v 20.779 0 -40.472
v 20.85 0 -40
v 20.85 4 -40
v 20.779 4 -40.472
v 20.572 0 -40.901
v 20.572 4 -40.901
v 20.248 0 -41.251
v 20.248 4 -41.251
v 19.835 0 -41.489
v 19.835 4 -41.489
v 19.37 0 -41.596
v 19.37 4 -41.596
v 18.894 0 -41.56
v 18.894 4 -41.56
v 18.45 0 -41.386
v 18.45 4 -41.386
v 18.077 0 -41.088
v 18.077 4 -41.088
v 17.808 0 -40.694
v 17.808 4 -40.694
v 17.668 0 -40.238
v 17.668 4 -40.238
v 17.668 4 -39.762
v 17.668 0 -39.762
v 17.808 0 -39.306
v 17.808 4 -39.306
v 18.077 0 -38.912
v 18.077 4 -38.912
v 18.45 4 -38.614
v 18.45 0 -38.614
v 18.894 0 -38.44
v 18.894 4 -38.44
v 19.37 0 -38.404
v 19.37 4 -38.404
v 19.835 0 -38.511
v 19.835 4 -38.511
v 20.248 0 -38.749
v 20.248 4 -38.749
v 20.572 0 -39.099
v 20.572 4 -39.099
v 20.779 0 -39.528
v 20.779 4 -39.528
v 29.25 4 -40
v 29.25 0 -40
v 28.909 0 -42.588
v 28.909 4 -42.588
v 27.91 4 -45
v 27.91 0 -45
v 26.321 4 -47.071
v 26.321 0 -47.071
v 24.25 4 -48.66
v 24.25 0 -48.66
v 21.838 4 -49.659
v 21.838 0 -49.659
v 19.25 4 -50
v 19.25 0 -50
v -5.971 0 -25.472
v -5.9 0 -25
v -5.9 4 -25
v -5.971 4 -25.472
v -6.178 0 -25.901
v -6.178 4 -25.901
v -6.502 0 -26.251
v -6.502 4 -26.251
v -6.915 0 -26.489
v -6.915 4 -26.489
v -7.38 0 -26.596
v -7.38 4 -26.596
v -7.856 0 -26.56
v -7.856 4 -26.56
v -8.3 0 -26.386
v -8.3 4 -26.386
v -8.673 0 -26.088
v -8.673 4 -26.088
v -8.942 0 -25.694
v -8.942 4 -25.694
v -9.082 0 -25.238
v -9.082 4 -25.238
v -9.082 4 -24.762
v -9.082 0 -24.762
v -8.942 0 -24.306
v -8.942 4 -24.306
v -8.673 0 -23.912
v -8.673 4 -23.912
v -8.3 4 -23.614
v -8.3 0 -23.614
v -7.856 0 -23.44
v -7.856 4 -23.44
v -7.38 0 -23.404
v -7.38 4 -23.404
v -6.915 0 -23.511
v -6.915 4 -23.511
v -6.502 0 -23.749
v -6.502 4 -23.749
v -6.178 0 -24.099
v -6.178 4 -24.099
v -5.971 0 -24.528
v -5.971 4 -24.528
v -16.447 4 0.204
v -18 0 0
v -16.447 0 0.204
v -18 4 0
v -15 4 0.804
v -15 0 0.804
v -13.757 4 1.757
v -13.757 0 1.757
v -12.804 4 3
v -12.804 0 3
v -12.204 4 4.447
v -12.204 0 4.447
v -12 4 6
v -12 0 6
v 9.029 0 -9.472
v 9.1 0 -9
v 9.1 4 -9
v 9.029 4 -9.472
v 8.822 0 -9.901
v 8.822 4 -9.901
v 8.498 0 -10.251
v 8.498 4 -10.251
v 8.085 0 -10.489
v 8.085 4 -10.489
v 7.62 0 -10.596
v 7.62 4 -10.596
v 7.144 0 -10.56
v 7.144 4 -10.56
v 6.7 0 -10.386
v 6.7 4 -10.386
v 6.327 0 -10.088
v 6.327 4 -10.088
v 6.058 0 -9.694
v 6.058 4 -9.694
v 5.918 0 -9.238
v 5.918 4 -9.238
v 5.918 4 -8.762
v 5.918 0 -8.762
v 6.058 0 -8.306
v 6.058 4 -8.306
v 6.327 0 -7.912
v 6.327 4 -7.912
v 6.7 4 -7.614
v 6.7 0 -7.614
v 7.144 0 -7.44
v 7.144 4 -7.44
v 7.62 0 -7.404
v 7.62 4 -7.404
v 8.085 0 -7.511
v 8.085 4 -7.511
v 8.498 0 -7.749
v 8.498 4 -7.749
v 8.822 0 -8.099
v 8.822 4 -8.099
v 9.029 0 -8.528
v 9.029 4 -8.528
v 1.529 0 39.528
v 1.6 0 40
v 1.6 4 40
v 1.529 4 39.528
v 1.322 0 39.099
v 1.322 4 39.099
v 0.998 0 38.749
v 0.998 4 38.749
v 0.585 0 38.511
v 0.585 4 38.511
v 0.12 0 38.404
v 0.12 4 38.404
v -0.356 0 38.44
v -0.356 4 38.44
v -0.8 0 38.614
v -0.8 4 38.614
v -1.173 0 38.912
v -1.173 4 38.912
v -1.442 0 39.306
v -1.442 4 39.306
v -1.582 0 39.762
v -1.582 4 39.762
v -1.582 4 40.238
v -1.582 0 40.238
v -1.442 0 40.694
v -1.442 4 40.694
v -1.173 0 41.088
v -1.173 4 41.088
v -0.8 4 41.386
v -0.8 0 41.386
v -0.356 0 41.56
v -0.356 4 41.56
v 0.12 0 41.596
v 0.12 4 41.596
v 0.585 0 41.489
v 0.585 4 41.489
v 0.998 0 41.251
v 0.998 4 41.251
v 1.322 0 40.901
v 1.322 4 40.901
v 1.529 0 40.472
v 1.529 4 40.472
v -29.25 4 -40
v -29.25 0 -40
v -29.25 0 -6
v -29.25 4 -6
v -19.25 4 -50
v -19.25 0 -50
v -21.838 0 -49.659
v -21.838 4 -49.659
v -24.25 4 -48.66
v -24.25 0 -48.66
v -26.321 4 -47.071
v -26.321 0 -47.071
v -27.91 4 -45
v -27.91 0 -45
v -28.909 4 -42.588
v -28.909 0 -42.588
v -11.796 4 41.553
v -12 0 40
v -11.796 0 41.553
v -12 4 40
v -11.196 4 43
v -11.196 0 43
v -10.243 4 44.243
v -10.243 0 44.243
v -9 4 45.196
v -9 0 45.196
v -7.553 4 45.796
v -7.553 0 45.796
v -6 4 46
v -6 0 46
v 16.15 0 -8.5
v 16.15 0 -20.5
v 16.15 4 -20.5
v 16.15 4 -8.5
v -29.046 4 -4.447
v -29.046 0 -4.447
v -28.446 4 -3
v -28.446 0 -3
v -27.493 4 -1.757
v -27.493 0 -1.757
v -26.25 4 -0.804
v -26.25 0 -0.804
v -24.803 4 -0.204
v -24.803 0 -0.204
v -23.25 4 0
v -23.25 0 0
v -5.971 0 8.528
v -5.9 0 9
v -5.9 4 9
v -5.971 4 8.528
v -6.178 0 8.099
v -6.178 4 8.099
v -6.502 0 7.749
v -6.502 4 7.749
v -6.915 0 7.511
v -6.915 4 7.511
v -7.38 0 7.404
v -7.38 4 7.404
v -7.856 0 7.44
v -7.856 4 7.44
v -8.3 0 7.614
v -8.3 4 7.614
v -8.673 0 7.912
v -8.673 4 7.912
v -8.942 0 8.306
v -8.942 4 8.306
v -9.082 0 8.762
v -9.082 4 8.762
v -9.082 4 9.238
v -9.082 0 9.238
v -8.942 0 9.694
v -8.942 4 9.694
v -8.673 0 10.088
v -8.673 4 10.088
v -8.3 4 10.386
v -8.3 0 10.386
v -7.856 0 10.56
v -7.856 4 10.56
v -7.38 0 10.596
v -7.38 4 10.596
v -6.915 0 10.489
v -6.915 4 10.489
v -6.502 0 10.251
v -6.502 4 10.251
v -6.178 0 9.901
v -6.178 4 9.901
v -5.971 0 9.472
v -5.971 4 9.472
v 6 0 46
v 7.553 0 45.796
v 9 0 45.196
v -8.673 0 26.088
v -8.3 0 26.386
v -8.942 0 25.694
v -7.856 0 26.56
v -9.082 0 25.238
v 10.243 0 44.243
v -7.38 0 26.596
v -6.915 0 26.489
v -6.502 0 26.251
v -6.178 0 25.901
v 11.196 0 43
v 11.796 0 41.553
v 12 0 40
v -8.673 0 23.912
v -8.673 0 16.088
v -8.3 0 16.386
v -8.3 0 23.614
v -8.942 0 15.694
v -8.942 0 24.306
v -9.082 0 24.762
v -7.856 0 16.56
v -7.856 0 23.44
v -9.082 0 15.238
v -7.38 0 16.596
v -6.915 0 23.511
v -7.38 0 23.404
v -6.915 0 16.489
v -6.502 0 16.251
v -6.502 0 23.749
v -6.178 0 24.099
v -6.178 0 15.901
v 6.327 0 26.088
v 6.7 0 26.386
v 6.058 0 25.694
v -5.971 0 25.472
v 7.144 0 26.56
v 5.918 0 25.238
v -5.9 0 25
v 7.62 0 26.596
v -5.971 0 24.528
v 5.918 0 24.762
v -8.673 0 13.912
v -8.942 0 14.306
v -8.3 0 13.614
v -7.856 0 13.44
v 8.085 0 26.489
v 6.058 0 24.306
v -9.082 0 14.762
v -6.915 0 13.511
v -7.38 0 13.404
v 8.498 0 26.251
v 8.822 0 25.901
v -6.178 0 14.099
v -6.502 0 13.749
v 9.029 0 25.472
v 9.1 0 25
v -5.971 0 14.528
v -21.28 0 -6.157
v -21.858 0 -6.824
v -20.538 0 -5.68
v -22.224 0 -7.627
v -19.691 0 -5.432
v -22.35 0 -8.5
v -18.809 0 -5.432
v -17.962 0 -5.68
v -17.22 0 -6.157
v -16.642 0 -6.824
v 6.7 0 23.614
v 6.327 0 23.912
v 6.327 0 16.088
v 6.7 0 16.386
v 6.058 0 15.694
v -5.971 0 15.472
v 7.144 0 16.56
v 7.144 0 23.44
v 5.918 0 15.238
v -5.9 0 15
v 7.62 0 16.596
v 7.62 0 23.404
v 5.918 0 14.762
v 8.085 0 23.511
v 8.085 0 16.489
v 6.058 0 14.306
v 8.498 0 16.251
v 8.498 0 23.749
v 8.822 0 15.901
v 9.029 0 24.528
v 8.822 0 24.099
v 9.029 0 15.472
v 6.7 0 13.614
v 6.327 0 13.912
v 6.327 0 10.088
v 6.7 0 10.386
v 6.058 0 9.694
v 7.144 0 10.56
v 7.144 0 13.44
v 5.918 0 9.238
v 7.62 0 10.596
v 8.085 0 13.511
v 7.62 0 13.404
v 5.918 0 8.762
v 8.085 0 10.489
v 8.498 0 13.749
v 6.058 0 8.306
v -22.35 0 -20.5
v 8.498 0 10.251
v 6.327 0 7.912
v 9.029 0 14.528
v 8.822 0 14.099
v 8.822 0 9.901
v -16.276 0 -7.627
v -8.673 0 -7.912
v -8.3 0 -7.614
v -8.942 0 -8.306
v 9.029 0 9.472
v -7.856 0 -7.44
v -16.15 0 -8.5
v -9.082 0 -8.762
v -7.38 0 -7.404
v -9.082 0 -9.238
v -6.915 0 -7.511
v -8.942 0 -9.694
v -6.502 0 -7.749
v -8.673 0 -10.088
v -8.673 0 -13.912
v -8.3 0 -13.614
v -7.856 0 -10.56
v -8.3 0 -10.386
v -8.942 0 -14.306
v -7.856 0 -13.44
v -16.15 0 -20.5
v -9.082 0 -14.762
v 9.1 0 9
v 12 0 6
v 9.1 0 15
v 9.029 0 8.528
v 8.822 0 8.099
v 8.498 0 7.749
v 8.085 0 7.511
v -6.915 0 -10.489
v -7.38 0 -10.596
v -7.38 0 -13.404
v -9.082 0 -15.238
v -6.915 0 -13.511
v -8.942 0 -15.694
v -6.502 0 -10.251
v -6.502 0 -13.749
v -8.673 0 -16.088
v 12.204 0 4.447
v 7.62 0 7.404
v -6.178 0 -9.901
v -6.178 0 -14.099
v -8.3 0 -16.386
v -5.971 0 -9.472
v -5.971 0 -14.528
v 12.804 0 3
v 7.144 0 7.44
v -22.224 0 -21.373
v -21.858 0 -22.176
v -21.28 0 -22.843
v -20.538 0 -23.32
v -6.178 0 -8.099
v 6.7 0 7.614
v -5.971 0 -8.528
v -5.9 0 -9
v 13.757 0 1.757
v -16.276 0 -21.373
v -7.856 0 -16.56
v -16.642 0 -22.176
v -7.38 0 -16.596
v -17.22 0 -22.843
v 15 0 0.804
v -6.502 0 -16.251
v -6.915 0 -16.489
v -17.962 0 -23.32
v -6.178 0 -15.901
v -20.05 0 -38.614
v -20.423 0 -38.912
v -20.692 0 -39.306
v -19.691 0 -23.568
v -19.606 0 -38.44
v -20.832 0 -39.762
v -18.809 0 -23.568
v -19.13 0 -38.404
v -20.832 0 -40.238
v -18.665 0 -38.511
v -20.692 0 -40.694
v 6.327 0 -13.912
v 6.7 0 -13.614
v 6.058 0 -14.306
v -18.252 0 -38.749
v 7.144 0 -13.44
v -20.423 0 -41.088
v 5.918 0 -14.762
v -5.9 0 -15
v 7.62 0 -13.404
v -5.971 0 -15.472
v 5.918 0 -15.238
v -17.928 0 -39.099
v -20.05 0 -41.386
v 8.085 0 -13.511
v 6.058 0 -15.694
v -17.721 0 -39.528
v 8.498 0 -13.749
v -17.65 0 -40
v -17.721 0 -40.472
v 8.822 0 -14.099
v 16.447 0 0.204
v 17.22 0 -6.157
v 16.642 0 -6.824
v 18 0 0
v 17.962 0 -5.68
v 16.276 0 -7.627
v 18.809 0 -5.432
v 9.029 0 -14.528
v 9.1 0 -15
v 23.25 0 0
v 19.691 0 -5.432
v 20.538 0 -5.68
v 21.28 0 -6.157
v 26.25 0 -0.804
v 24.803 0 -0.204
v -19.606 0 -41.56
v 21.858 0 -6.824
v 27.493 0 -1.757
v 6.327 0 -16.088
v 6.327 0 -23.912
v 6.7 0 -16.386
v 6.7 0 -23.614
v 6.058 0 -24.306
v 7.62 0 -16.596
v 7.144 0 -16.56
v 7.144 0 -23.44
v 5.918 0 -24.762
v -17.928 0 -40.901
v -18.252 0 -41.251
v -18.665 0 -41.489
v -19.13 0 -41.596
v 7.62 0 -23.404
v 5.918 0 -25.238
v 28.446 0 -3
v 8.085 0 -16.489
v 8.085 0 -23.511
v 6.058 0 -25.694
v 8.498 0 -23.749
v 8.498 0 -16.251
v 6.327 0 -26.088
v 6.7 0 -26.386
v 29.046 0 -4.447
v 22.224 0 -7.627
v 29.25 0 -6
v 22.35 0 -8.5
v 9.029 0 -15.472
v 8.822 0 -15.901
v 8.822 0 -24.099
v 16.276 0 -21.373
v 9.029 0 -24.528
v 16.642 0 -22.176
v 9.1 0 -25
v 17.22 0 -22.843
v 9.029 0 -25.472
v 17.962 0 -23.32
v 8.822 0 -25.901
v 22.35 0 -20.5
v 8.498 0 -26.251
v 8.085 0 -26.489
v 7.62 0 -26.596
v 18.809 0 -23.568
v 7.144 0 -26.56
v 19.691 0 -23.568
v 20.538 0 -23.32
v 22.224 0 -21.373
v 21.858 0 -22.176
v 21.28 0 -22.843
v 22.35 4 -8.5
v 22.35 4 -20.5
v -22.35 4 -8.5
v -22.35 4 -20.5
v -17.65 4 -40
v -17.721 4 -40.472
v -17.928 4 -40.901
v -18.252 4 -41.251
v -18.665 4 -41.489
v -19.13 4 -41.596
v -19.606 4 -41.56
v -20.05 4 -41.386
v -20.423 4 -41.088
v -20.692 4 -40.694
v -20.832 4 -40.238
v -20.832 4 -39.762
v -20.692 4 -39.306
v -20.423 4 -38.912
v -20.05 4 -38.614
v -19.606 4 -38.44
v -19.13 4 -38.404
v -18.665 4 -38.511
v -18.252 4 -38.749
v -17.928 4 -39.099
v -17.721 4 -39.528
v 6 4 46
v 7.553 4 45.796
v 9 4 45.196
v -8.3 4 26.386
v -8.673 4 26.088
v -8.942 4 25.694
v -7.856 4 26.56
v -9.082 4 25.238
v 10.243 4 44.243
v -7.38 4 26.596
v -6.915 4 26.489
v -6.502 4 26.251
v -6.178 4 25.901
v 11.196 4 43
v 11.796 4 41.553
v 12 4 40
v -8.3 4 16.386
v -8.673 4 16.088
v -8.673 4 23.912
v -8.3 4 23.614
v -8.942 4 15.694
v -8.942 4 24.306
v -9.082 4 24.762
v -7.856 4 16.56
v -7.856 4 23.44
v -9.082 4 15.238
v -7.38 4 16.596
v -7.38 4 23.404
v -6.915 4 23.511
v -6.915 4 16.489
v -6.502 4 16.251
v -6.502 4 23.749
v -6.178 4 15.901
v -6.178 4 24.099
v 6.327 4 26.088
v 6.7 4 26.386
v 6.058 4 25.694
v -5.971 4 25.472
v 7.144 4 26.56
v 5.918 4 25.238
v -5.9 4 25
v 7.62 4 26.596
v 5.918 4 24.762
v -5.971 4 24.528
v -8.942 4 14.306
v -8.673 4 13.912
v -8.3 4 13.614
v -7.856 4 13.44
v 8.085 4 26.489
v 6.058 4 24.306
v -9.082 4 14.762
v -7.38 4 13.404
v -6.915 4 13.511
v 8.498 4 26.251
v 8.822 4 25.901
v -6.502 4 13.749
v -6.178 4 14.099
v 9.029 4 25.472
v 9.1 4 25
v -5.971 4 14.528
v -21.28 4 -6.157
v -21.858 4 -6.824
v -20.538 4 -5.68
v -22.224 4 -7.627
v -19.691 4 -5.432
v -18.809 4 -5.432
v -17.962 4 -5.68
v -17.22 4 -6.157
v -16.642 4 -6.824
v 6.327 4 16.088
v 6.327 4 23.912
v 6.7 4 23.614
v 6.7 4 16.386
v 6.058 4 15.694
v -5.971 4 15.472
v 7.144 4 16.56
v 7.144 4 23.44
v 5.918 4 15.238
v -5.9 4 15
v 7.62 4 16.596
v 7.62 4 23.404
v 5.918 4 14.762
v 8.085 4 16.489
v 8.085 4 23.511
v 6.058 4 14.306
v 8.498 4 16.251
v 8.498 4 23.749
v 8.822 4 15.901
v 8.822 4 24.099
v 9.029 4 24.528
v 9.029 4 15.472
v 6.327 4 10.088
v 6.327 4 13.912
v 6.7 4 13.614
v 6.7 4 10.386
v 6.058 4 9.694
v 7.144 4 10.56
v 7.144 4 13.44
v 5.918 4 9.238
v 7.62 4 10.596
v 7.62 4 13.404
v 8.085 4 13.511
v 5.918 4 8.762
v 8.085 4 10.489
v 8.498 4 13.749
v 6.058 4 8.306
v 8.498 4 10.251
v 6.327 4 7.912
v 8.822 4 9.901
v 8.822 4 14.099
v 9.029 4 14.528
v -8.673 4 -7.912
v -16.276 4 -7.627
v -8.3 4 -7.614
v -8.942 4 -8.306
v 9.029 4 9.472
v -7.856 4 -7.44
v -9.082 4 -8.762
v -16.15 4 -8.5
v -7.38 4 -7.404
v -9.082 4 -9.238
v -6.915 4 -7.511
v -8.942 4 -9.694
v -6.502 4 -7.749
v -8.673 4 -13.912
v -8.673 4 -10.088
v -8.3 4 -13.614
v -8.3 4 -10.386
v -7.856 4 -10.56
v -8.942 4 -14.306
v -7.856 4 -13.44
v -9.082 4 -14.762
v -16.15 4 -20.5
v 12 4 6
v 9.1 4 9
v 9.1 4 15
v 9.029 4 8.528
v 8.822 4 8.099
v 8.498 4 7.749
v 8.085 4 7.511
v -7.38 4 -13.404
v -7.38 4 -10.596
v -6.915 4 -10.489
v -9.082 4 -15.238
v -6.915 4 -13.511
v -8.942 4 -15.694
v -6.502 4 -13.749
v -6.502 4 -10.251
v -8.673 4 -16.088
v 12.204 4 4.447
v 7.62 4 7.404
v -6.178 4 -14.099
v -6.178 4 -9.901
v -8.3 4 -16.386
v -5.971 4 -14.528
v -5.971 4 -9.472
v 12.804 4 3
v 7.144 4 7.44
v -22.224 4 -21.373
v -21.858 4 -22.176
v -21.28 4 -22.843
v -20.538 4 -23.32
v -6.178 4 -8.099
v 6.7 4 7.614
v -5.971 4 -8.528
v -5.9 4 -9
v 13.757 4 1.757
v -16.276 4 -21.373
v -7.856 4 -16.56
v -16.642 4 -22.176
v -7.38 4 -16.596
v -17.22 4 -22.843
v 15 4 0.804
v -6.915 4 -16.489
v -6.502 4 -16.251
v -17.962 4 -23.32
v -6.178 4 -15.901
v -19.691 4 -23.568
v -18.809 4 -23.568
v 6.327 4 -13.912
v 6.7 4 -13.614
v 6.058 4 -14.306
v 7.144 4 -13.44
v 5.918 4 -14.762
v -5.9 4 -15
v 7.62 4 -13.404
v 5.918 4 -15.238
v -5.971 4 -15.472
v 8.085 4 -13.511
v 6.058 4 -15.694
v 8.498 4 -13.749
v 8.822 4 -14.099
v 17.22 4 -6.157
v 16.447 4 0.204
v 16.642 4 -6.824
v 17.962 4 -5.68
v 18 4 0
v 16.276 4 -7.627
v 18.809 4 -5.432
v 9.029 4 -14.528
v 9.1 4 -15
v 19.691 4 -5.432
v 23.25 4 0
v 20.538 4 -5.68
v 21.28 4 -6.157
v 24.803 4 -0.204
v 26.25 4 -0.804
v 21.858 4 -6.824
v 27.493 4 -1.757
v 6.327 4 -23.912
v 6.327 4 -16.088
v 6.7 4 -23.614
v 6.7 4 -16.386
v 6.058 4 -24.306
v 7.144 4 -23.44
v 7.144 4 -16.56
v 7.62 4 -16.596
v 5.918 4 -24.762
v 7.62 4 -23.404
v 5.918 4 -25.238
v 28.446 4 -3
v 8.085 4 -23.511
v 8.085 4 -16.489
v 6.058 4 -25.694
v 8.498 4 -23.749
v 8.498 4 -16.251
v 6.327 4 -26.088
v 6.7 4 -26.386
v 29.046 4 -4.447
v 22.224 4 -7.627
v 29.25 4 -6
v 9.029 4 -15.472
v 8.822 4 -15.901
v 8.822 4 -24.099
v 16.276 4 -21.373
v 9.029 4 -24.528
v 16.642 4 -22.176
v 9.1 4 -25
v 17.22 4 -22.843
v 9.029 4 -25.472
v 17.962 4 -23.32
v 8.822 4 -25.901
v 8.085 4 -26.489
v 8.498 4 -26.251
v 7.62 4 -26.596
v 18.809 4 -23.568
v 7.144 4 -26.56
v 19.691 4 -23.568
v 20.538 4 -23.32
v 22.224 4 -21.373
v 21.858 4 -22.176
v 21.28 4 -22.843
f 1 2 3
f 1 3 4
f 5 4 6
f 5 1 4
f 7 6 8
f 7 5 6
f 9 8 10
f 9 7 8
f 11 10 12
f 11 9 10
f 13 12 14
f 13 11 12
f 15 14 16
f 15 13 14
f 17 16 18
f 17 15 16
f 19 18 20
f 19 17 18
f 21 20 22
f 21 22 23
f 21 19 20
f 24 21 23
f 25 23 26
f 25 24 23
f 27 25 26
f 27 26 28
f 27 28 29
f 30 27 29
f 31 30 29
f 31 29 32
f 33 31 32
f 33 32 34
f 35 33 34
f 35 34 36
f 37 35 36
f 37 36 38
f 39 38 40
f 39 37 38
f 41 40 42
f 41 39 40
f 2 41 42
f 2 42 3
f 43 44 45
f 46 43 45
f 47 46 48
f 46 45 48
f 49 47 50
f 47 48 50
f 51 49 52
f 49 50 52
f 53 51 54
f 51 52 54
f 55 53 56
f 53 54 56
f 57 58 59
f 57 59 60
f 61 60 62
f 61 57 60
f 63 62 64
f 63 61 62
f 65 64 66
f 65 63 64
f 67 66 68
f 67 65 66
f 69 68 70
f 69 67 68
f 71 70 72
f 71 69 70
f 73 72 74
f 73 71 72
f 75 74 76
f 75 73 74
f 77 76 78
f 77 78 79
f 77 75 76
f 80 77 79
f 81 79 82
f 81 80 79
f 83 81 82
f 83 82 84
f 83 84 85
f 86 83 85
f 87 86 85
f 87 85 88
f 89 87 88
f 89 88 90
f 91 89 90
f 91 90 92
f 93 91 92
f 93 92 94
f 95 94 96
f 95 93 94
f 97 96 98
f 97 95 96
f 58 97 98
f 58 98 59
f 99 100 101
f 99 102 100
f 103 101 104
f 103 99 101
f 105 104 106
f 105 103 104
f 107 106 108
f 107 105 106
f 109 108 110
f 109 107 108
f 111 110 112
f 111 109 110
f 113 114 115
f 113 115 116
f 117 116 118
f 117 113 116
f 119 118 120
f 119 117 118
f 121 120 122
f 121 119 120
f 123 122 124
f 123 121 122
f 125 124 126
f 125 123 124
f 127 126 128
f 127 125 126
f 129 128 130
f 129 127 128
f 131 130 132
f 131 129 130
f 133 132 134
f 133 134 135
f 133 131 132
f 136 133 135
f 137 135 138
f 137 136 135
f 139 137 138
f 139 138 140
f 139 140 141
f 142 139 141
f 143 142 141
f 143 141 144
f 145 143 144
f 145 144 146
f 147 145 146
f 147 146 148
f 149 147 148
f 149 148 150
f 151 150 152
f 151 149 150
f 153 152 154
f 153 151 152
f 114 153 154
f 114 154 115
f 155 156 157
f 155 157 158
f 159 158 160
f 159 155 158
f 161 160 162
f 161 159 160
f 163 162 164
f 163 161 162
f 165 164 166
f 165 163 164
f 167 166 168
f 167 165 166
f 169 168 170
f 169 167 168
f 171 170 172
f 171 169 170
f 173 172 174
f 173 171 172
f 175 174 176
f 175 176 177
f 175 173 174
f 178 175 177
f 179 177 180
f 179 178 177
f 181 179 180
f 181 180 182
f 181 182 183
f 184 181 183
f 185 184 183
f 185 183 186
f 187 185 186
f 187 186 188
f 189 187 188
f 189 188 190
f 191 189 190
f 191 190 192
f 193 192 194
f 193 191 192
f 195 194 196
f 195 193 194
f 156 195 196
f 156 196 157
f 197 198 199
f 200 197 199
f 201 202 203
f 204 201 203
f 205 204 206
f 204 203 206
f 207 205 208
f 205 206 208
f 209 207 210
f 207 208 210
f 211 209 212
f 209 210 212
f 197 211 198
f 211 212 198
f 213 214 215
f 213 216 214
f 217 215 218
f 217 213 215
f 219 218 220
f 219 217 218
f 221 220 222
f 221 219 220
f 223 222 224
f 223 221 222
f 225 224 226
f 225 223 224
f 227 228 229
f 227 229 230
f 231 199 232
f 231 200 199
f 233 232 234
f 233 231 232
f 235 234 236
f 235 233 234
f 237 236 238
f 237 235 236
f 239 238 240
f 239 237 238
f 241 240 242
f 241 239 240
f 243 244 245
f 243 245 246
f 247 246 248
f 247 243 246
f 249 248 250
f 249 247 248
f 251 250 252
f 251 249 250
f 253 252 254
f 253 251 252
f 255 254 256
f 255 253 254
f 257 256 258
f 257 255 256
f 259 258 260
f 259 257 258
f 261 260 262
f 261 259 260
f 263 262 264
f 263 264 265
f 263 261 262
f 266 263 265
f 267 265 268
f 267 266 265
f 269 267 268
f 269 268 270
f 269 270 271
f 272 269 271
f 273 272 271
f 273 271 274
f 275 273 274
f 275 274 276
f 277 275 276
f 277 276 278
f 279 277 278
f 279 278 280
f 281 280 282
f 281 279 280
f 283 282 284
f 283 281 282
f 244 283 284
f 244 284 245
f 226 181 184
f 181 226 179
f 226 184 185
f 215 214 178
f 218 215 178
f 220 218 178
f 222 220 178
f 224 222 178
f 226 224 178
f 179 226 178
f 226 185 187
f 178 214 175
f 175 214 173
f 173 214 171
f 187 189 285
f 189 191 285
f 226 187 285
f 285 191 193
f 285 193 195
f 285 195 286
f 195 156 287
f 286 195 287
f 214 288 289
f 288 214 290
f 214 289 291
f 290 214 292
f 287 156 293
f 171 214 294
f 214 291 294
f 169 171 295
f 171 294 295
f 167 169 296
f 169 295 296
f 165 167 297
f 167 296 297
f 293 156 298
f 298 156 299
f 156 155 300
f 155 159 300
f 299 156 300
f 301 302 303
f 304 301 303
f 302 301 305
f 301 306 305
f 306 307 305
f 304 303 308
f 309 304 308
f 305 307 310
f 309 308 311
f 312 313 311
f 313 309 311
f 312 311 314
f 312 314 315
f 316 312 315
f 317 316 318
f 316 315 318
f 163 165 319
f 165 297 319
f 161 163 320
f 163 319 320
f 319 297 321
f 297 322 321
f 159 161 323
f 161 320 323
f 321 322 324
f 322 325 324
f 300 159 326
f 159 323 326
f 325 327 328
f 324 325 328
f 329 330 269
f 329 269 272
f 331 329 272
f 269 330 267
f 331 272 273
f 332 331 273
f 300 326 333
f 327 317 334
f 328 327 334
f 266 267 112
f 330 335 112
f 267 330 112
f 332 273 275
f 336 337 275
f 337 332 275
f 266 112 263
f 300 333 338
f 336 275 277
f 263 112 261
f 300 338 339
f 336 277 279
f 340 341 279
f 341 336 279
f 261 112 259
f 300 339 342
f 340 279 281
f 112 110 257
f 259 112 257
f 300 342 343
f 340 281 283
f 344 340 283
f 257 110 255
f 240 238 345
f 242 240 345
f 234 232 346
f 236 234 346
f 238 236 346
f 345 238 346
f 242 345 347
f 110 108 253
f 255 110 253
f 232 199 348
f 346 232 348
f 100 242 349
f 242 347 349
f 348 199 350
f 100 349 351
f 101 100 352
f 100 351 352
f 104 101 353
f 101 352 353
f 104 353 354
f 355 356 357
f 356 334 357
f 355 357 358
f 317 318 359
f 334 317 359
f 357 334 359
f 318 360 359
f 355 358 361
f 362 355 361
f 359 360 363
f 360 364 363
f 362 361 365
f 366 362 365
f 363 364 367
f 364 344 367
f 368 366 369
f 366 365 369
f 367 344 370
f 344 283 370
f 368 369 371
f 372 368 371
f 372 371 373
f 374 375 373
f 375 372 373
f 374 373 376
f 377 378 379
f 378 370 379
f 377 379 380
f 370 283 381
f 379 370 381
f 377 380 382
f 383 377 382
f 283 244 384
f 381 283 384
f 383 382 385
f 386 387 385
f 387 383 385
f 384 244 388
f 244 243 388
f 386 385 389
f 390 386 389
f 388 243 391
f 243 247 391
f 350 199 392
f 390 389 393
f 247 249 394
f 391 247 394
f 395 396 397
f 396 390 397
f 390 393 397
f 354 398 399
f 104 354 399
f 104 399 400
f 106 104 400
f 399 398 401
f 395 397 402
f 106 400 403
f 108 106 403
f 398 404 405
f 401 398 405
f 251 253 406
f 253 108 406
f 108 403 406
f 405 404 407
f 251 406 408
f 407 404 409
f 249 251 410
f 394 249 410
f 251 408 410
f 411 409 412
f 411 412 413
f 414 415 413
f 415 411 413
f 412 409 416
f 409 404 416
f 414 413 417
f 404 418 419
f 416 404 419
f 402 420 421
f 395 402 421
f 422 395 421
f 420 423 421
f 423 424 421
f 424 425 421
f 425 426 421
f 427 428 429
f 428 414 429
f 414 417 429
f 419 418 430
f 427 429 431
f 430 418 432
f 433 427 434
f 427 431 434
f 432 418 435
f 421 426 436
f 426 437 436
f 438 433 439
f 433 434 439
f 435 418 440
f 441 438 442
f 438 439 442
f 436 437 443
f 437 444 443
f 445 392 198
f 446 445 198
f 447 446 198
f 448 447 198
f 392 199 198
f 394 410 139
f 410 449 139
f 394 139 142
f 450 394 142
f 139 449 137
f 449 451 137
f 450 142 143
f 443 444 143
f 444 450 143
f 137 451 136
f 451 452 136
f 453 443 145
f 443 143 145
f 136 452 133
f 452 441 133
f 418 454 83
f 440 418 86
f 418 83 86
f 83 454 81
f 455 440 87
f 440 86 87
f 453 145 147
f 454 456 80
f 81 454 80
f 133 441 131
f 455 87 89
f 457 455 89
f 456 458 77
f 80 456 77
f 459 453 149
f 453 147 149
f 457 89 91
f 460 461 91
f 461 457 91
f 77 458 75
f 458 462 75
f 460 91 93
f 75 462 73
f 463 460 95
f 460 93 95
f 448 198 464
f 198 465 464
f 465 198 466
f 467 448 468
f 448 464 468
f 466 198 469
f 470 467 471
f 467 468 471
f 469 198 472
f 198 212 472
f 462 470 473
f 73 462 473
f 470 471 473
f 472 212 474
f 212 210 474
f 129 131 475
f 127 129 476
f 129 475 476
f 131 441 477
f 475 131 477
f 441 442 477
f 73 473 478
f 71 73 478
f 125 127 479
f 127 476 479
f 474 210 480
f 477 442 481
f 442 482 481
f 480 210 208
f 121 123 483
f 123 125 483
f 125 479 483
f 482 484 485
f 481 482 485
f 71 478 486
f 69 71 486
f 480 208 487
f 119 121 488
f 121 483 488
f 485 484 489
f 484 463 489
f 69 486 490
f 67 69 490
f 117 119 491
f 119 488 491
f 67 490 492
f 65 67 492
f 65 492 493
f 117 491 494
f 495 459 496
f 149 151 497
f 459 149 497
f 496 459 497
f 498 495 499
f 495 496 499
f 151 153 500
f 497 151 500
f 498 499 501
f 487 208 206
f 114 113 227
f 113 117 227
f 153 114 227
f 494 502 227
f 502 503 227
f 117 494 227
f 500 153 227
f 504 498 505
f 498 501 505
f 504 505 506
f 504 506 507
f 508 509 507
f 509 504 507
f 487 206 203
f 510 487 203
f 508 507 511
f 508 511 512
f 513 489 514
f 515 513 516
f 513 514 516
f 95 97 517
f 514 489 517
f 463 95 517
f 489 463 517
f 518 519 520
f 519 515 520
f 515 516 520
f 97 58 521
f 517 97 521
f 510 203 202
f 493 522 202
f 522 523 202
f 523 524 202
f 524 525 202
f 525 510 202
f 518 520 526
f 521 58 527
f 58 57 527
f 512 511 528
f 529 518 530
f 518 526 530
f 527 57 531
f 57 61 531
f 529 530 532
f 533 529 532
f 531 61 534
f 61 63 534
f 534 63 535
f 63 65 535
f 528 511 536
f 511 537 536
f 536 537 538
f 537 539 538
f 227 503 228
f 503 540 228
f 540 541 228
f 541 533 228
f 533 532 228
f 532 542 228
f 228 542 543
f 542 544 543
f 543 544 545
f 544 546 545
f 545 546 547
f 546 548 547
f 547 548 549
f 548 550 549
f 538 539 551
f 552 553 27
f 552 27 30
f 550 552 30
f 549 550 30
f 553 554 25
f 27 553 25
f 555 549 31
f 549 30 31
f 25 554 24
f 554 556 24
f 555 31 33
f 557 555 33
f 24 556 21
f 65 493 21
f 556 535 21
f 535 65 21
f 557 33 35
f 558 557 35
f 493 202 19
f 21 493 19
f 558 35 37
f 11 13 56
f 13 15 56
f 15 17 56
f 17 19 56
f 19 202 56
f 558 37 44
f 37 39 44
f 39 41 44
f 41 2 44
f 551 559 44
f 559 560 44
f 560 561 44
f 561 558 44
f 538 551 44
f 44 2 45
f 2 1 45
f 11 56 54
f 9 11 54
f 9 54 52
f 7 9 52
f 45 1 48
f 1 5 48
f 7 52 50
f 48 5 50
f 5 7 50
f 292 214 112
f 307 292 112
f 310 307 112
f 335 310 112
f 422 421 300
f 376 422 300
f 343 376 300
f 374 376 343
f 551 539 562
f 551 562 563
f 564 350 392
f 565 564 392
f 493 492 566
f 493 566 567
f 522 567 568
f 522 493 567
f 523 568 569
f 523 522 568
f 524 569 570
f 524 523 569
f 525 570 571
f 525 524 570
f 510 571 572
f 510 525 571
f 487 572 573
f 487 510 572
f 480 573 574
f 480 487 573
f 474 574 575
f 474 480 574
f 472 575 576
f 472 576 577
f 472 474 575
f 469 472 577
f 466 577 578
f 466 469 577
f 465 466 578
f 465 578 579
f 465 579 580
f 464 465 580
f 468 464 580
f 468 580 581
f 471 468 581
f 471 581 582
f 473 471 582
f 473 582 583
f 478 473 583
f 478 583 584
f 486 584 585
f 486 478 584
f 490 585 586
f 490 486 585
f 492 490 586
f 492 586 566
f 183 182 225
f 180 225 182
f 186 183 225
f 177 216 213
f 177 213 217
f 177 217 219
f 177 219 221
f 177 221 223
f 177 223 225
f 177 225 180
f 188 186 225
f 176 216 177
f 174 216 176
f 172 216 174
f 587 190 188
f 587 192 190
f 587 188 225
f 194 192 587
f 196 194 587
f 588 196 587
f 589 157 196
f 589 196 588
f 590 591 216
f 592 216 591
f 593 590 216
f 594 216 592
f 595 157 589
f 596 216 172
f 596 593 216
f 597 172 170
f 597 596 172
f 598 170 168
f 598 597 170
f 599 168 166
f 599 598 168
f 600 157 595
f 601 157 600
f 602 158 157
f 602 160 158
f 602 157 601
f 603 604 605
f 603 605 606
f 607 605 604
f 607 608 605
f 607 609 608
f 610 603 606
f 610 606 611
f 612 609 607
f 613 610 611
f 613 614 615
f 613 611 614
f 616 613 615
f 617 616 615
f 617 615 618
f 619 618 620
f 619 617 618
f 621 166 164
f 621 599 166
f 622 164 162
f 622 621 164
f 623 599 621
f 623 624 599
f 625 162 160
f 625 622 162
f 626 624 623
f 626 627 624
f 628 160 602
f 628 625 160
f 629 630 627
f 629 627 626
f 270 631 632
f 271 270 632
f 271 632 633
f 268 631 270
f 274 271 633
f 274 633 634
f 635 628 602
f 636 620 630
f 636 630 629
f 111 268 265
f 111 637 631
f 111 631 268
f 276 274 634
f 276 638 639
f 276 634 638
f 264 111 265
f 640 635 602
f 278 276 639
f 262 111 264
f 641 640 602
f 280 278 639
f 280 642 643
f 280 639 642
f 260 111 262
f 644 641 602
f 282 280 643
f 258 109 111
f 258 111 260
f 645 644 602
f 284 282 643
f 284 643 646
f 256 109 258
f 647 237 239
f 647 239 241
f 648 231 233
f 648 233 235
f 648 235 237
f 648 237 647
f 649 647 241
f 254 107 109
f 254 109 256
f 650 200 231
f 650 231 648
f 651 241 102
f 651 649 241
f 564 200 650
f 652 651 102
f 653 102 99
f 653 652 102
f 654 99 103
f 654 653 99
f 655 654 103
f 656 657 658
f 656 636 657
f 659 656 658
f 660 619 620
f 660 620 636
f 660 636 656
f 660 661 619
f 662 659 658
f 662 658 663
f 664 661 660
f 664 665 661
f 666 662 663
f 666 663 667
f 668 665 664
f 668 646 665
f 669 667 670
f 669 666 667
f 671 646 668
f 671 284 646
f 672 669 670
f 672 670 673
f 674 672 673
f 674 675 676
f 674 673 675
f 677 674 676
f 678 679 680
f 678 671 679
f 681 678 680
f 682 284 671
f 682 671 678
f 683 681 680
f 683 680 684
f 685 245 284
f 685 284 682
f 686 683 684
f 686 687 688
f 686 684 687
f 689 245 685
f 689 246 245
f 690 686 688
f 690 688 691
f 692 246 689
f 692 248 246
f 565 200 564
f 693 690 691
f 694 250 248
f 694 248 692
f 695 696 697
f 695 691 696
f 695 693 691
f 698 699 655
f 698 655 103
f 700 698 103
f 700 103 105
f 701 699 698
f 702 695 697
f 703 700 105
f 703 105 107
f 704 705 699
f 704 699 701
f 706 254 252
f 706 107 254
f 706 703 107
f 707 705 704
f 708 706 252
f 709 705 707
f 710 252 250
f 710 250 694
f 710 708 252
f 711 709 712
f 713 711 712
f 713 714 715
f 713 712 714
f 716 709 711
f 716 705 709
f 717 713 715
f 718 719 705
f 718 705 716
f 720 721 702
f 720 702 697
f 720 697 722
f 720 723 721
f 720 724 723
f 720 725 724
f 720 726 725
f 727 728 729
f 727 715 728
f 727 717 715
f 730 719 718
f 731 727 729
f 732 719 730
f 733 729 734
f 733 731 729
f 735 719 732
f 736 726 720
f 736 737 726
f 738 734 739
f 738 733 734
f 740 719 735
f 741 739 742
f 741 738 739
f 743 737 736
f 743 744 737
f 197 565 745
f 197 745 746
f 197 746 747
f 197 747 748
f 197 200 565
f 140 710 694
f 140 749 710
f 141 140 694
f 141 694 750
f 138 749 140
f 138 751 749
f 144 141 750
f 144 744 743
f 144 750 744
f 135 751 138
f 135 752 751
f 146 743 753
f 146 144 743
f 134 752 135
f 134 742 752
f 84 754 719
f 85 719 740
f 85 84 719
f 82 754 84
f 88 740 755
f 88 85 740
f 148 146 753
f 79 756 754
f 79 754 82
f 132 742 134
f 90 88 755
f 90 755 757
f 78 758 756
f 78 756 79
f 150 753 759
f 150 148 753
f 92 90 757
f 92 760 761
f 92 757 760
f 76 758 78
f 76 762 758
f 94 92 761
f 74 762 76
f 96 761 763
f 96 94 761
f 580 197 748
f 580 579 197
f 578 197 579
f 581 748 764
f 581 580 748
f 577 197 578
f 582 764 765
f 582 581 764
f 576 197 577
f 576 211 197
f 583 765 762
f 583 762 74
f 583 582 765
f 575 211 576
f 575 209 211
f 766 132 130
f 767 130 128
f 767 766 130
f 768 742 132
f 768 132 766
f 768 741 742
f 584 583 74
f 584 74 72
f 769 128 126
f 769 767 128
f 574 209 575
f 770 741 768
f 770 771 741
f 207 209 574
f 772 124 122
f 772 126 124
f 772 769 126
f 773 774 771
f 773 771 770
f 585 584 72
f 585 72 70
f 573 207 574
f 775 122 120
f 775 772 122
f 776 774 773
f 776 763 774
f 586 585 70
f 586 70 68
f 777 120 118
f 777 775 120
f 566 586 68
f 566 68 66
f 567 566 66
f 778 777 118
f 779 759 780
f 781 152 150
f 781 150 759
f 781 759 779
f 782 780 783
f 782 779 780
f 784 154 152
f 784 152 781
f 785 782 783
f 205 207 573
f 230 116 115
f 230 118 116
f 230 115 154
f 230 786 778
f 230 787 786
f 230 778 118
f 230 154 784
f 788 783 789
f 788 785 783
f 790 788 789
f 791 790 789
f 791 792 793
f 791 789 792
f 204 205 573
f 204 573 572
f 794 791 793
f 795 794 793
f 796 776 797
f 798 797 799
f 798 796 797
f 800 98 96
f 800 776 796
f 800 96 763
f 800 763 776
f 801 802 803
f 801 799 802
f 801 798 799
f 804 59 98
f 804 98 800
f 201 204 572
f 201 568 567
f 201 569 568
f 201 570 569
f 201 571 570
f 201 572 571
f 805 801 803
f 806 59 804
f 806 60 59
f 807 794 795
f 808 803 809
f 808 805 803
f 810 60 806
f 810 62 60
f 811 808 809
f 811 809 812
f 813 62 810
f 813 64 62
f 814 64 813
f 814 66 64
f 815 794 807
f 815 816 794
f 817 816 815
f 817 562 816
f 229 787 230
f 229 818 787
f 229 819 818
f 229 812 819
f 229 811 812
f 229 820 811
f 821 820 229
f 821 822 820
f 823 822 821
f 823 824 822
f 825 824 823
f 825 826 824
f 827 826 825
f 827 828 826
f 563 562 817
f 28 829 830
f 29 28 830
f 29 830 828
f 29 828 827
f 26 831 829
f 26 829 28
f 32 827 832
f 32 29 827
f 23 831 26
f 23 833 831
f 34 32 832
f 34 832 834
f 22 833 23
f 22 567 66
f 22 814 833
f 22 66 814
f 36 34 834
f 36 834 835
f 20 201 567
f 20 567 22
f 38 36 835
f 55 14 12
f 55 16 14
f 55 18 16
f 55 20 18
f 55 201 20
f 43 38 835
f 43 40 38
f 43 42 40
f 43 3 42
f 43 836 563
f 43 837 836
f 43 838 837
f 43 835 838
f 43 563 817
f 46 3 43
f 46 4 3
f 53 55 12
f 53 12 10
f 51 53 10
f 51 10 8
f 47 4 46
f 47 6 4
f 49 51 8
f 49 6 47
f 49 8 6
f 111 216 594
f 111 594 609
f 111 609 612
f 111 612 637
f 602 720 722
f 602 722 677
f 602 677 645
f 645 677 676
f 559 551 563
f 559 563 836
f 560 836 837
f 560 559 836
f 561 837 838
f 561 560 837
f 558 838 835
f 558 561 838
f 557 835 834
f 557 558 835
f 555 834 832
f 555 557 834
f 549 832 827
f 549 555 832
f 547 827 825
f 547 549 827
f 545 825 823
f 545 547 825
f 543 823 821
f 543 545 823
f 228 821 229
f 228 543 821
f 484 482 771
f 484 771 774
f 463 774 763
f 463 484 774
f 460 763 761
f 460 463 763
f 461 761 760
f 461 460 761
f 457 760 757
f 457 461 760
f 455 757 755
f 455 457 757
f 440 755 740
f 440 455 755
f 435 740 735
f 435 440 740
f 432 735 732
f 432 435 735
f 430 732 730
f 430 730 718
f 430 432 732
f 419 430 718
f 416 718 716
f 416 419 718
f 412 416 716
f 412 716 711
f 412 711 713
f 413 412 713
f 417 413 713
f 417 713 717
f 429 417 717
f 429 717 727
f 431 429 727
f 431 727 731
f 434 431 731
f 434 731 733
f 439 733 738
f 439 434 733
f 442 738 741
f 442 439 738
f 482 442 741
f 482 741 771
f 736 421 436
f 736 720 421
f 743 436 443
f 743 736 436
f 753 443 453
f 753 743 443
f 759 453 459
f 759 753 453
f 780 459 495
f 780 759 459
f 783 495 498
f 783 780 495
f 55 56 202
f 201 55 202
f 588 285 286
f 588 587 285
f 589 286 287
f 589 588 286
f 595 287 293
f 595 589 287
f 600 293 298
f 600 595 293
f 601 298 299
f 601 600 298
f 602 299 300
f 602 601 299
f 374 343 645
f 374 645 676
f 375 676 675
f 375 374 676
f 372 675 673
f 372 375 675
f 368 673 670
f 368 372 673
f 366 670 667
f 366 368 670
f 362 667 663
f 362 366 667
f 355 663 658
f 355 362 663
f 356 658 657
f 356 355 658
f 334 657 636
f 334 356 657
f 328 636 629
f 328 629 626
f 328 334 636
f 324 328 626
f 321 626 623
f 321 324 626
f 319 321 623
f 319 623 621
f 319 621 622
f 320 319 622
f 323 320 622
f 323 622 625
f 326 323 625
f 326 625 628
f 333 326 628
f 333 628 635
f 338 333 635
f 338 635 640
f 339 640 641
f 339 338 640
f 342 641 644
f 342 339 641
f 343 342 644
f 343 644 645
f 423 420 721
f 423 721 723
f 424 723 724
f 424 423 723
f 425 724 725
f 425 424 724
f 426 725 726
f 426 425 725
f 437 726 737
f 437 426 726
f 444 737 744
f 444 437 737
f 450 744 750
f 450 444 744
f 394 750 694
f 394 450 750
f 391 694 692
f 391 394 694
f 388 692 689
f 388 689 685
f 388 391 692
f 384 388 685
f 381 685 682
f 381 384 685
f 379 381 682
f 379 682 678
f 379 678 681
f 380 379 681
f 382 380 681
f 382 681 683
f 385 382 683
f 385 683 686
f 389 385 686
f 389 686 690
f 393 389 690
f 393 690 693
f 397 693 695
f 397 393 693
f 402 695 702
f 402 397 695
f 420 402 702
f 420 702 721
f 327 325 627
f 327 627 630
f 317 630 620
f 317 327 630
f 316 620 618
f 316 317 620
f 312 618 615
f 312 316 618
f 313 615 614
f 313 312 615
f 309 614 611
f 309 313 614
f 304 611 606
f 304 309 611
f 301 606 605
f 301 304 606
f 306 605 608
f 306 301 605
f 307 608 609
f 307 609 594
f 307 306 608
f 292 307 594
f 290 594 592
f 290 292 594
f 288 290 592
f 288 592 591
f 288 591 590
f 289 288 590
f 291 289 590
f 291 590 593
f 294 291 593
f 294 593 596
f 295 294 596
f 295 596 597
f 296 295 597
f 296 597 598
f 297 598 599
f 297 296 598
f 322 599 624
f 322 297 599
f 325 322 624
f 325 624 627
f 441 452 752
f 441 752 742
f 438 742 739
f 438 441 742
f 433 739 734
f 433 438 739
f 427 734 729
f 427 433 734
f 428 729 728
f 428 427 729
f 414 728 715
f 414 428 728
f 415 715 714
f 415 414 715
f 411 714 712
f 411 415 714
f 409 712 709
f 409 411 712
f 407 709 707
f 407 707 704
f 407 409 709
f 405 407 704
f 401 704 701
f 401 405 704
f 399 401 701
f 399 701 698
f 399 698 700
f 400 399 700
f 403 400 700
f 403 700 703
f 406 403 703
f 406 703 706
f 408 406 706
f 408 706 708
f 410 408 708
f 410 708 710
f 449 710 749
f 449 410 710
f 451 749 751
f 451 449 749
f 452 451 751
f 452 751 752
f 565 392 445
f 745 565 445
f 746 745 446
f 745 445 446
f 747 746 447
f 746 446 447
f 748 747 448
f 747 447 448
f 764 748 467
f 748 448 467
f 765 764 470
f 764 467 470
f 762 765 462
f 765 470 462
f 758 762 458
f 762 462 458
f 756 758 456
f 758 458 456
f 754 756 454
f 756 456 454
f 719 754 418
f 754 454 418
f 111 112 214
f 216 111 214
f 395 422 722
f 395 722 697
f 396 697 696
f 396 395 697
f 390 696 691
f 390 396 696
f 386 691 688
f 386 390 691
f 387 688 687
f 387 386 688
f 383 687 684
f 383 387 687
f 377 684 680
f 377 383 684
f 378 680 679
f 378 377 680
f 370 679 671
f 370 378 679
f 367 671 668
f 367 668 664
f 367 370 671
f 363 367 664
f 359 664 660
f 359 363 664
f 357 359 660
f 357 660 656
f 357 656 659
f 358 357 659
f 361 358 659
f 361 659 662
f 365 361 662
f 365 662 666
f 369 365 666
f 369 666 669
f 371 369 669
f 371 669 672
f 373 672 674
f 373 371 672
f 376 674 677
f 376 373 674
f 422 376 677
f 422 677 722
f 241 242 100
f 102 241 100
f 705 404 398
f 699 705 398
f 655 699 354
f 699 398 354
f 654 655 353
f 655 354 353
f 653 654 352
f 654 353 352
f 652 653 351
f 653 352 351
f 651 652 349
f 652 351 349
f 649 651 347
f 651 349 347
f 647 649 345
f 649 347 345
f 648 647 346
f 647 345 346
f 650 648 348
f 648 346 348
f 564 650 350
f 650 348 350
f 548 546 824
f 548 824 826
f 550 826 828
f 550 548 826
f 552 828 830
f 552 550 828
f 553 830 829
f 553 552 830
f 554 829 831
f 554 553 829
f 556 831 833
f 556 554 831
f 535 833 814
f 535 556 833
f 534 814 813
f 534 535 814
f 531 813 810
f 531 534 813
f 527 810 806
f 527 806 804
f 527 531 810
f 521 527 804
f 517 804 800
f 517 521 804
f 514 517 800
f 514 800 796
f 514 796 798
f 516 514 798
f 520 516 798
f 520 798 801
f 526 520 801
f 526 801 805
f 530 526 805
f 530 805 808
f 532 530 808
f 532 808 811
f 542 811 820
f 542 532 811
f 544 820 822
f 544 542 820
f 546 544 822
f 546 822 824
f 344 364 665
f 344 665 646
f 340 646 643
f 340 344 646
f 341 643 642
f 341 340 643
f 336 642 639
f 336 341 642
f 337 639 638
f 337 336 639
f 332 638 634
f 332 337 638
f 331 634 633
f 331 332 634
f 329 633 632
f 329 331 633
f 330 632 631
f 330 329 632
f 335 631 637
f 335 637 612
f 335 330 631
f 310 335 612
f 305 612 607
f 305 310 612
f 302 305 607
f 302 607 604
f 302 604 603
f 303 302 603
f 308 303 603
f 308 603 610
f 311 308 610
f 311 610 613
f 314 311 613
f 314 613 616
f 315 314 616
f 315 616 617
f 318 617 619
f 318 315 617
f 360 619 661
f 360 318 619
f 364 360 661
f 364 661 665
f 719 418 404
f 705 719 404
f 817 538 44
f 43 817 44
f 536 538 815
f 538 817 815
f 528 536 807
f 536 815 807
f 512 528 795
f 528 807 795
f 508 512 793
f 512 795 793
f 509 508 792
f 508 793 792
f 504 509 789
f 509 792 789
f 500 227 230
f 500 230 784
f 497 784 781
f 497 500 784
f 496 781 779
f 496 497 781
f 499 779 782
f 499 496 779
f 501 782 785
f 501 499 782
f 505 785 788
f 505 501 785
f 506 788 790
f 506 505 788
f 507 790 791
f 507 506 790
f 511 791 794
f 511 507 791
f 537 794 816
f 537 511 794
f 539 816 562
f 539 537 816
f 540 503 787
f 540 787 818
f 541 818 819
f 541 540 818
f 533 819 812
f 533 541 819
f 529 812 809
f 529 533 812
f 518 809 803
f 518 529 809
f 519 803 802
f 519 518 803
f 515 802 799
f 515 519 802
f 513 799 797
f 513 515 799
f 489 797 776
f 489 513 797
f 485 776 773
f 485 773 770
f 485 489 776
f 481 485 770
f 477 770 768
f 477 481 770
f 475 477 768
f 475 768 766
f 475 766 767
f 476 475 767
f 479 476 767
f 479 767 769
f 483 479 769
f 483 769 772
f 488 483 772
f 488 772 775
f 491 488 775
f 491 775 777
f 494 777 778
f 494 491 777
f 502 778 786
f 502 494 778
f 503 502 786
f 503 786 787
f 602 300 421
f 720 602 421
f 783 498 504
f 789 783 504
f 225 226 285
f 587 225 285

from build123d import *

# Parameters (mm, degrees)
SKETCH1_R           = 1.6
BOSS_EXTRUDE1_DEPTH = 4
FILLET1_R           = 6


with BuildPart() as part:
    # Sketch1 → Boss-Extrude1 (new body)
    with BuildSketch(Plane(origin=(0, 0, 0), x_dir=(1, 0, 0), z_dir=(0, 1, 0))):
        with BuildLine():
            Line((-29.25, 40), (-29.25, 0))
            Line((-29.25, 0), (-12, 0))
            Line((-12, 0), (-12, -46))
            Line((-12, -46), (12, -46))
            Line((12, -46), (12, 0))
            Line((12, 0), (29.25, 0))
            Line((29.25, 0), (29.25, 40))
            ThreePointArc((29.25, 40), (26.321067812, 47.071067812), (19.25, 50))
            Line((19.25, 50), (-19.25, 50))
            ThreePointArc((-19.25, 50), (-26.321067812, 47.071067812), (-29.25, 40))
        make_face()
        with Locations((-19.25, 40)):
            Circle(SKETCH1_R, mode=Mode.SUBTRACT)
        with Locations((19.25, 40)):
            Circle(SKETCH1_R, mode=Mode.SUBTRACT)
        with Locations((0, -40)):
            Circle(SKETCH1_R, mode=Mode.SUBTRACT)
        with Locations((-7.5, 25)):
            Circle(SKETCH1_R, mode=Mode.SUBTRACT)
        with Locations((7.5, 25)):
            Circle(SKETCH1_R, mode=Mode.SUBTRACT)
        with Locations((7.5, 15)):
            Circle(SKETCH1_R, mode=Mode.SUBTRACT)
        with Locations((-7.5, 15)):
            Circle(SKETCH1_R, mode=Mode.SUBTRACT)
        with Locations((-7.5, 9)):
            Circle(SKETCH1_R, mode=Mode.SUBTRACT)
        with Locations((7.5, 9)):
            Circle(SKETCH1_R, mode=Mode.SUBTRACT)
        with Locations((7.5, -9)):
            Circle(SKETCH1_R, mode=Mode.SUBTRACT)
        with Locations((-7.5, -9)):
            Circle(SKETCH1_R, mode=Mode.SUBTRACT)
        with Locations((7.5, -15)):
            Circle(SKETCH1_R, mode=Mode.SUBTRACT)
        with Locations((-7.5, -15)):
            Circle(SKETCH1_R, mode=Mode.SUBTRACT)
        with Locations((7.5, -25)):
            Circle(SKETCH1_R, mode=Mode.SUBTRACT)
        with Locations((-7.5, -25)):
            Circle(SKETCH1_R, mode=Mode.SUBTRACT)
        with BuildLine():
            Line((-16.15, 20.5), (-16.15, 8.5))
            ThreePointArc((-16.15, 8.5), (-19.25, 5.4), (-22.35, 8.5))
            Line((-22.35, 8.5), (-22.35, 20.5))
            ThreePointArc((-22.35, 20.5), (-19.25, 23.6), (-16.15, 20.5))
        make_face(mode=Mode.SUBTRACT)
        with BuildLine():
            Line((16.15, 20.5), (16.15, 8.5))
            ThreePointArc((16.15, 8.5), (19.25, 5.4), (22.35, 8.5))
            Line((22.35, 8.5), (22.35, 20.5))
            ThreePointArc((22.35, 20.5), (19.25, 23.6), (16.15, 20.5))
        make_face(mode=Mode.SUBTRACT)
    extrude(amount=BOSS_EXTRUDE1_DEPTH)

    # Fillet1
    fillet1_edges = [part.edges().sort_by_distance(p)[0] for p in [
        (29.25, 2, 0),
        (12, 2, 0),
        (12, 2, 46),
        (-12, 2, 46),
        (-12, 2, 0),
        (-29.25, 2, 0),
    ]]
    fillet(fillet1_edges, radius=FILLET1_R)


solid = part.part
